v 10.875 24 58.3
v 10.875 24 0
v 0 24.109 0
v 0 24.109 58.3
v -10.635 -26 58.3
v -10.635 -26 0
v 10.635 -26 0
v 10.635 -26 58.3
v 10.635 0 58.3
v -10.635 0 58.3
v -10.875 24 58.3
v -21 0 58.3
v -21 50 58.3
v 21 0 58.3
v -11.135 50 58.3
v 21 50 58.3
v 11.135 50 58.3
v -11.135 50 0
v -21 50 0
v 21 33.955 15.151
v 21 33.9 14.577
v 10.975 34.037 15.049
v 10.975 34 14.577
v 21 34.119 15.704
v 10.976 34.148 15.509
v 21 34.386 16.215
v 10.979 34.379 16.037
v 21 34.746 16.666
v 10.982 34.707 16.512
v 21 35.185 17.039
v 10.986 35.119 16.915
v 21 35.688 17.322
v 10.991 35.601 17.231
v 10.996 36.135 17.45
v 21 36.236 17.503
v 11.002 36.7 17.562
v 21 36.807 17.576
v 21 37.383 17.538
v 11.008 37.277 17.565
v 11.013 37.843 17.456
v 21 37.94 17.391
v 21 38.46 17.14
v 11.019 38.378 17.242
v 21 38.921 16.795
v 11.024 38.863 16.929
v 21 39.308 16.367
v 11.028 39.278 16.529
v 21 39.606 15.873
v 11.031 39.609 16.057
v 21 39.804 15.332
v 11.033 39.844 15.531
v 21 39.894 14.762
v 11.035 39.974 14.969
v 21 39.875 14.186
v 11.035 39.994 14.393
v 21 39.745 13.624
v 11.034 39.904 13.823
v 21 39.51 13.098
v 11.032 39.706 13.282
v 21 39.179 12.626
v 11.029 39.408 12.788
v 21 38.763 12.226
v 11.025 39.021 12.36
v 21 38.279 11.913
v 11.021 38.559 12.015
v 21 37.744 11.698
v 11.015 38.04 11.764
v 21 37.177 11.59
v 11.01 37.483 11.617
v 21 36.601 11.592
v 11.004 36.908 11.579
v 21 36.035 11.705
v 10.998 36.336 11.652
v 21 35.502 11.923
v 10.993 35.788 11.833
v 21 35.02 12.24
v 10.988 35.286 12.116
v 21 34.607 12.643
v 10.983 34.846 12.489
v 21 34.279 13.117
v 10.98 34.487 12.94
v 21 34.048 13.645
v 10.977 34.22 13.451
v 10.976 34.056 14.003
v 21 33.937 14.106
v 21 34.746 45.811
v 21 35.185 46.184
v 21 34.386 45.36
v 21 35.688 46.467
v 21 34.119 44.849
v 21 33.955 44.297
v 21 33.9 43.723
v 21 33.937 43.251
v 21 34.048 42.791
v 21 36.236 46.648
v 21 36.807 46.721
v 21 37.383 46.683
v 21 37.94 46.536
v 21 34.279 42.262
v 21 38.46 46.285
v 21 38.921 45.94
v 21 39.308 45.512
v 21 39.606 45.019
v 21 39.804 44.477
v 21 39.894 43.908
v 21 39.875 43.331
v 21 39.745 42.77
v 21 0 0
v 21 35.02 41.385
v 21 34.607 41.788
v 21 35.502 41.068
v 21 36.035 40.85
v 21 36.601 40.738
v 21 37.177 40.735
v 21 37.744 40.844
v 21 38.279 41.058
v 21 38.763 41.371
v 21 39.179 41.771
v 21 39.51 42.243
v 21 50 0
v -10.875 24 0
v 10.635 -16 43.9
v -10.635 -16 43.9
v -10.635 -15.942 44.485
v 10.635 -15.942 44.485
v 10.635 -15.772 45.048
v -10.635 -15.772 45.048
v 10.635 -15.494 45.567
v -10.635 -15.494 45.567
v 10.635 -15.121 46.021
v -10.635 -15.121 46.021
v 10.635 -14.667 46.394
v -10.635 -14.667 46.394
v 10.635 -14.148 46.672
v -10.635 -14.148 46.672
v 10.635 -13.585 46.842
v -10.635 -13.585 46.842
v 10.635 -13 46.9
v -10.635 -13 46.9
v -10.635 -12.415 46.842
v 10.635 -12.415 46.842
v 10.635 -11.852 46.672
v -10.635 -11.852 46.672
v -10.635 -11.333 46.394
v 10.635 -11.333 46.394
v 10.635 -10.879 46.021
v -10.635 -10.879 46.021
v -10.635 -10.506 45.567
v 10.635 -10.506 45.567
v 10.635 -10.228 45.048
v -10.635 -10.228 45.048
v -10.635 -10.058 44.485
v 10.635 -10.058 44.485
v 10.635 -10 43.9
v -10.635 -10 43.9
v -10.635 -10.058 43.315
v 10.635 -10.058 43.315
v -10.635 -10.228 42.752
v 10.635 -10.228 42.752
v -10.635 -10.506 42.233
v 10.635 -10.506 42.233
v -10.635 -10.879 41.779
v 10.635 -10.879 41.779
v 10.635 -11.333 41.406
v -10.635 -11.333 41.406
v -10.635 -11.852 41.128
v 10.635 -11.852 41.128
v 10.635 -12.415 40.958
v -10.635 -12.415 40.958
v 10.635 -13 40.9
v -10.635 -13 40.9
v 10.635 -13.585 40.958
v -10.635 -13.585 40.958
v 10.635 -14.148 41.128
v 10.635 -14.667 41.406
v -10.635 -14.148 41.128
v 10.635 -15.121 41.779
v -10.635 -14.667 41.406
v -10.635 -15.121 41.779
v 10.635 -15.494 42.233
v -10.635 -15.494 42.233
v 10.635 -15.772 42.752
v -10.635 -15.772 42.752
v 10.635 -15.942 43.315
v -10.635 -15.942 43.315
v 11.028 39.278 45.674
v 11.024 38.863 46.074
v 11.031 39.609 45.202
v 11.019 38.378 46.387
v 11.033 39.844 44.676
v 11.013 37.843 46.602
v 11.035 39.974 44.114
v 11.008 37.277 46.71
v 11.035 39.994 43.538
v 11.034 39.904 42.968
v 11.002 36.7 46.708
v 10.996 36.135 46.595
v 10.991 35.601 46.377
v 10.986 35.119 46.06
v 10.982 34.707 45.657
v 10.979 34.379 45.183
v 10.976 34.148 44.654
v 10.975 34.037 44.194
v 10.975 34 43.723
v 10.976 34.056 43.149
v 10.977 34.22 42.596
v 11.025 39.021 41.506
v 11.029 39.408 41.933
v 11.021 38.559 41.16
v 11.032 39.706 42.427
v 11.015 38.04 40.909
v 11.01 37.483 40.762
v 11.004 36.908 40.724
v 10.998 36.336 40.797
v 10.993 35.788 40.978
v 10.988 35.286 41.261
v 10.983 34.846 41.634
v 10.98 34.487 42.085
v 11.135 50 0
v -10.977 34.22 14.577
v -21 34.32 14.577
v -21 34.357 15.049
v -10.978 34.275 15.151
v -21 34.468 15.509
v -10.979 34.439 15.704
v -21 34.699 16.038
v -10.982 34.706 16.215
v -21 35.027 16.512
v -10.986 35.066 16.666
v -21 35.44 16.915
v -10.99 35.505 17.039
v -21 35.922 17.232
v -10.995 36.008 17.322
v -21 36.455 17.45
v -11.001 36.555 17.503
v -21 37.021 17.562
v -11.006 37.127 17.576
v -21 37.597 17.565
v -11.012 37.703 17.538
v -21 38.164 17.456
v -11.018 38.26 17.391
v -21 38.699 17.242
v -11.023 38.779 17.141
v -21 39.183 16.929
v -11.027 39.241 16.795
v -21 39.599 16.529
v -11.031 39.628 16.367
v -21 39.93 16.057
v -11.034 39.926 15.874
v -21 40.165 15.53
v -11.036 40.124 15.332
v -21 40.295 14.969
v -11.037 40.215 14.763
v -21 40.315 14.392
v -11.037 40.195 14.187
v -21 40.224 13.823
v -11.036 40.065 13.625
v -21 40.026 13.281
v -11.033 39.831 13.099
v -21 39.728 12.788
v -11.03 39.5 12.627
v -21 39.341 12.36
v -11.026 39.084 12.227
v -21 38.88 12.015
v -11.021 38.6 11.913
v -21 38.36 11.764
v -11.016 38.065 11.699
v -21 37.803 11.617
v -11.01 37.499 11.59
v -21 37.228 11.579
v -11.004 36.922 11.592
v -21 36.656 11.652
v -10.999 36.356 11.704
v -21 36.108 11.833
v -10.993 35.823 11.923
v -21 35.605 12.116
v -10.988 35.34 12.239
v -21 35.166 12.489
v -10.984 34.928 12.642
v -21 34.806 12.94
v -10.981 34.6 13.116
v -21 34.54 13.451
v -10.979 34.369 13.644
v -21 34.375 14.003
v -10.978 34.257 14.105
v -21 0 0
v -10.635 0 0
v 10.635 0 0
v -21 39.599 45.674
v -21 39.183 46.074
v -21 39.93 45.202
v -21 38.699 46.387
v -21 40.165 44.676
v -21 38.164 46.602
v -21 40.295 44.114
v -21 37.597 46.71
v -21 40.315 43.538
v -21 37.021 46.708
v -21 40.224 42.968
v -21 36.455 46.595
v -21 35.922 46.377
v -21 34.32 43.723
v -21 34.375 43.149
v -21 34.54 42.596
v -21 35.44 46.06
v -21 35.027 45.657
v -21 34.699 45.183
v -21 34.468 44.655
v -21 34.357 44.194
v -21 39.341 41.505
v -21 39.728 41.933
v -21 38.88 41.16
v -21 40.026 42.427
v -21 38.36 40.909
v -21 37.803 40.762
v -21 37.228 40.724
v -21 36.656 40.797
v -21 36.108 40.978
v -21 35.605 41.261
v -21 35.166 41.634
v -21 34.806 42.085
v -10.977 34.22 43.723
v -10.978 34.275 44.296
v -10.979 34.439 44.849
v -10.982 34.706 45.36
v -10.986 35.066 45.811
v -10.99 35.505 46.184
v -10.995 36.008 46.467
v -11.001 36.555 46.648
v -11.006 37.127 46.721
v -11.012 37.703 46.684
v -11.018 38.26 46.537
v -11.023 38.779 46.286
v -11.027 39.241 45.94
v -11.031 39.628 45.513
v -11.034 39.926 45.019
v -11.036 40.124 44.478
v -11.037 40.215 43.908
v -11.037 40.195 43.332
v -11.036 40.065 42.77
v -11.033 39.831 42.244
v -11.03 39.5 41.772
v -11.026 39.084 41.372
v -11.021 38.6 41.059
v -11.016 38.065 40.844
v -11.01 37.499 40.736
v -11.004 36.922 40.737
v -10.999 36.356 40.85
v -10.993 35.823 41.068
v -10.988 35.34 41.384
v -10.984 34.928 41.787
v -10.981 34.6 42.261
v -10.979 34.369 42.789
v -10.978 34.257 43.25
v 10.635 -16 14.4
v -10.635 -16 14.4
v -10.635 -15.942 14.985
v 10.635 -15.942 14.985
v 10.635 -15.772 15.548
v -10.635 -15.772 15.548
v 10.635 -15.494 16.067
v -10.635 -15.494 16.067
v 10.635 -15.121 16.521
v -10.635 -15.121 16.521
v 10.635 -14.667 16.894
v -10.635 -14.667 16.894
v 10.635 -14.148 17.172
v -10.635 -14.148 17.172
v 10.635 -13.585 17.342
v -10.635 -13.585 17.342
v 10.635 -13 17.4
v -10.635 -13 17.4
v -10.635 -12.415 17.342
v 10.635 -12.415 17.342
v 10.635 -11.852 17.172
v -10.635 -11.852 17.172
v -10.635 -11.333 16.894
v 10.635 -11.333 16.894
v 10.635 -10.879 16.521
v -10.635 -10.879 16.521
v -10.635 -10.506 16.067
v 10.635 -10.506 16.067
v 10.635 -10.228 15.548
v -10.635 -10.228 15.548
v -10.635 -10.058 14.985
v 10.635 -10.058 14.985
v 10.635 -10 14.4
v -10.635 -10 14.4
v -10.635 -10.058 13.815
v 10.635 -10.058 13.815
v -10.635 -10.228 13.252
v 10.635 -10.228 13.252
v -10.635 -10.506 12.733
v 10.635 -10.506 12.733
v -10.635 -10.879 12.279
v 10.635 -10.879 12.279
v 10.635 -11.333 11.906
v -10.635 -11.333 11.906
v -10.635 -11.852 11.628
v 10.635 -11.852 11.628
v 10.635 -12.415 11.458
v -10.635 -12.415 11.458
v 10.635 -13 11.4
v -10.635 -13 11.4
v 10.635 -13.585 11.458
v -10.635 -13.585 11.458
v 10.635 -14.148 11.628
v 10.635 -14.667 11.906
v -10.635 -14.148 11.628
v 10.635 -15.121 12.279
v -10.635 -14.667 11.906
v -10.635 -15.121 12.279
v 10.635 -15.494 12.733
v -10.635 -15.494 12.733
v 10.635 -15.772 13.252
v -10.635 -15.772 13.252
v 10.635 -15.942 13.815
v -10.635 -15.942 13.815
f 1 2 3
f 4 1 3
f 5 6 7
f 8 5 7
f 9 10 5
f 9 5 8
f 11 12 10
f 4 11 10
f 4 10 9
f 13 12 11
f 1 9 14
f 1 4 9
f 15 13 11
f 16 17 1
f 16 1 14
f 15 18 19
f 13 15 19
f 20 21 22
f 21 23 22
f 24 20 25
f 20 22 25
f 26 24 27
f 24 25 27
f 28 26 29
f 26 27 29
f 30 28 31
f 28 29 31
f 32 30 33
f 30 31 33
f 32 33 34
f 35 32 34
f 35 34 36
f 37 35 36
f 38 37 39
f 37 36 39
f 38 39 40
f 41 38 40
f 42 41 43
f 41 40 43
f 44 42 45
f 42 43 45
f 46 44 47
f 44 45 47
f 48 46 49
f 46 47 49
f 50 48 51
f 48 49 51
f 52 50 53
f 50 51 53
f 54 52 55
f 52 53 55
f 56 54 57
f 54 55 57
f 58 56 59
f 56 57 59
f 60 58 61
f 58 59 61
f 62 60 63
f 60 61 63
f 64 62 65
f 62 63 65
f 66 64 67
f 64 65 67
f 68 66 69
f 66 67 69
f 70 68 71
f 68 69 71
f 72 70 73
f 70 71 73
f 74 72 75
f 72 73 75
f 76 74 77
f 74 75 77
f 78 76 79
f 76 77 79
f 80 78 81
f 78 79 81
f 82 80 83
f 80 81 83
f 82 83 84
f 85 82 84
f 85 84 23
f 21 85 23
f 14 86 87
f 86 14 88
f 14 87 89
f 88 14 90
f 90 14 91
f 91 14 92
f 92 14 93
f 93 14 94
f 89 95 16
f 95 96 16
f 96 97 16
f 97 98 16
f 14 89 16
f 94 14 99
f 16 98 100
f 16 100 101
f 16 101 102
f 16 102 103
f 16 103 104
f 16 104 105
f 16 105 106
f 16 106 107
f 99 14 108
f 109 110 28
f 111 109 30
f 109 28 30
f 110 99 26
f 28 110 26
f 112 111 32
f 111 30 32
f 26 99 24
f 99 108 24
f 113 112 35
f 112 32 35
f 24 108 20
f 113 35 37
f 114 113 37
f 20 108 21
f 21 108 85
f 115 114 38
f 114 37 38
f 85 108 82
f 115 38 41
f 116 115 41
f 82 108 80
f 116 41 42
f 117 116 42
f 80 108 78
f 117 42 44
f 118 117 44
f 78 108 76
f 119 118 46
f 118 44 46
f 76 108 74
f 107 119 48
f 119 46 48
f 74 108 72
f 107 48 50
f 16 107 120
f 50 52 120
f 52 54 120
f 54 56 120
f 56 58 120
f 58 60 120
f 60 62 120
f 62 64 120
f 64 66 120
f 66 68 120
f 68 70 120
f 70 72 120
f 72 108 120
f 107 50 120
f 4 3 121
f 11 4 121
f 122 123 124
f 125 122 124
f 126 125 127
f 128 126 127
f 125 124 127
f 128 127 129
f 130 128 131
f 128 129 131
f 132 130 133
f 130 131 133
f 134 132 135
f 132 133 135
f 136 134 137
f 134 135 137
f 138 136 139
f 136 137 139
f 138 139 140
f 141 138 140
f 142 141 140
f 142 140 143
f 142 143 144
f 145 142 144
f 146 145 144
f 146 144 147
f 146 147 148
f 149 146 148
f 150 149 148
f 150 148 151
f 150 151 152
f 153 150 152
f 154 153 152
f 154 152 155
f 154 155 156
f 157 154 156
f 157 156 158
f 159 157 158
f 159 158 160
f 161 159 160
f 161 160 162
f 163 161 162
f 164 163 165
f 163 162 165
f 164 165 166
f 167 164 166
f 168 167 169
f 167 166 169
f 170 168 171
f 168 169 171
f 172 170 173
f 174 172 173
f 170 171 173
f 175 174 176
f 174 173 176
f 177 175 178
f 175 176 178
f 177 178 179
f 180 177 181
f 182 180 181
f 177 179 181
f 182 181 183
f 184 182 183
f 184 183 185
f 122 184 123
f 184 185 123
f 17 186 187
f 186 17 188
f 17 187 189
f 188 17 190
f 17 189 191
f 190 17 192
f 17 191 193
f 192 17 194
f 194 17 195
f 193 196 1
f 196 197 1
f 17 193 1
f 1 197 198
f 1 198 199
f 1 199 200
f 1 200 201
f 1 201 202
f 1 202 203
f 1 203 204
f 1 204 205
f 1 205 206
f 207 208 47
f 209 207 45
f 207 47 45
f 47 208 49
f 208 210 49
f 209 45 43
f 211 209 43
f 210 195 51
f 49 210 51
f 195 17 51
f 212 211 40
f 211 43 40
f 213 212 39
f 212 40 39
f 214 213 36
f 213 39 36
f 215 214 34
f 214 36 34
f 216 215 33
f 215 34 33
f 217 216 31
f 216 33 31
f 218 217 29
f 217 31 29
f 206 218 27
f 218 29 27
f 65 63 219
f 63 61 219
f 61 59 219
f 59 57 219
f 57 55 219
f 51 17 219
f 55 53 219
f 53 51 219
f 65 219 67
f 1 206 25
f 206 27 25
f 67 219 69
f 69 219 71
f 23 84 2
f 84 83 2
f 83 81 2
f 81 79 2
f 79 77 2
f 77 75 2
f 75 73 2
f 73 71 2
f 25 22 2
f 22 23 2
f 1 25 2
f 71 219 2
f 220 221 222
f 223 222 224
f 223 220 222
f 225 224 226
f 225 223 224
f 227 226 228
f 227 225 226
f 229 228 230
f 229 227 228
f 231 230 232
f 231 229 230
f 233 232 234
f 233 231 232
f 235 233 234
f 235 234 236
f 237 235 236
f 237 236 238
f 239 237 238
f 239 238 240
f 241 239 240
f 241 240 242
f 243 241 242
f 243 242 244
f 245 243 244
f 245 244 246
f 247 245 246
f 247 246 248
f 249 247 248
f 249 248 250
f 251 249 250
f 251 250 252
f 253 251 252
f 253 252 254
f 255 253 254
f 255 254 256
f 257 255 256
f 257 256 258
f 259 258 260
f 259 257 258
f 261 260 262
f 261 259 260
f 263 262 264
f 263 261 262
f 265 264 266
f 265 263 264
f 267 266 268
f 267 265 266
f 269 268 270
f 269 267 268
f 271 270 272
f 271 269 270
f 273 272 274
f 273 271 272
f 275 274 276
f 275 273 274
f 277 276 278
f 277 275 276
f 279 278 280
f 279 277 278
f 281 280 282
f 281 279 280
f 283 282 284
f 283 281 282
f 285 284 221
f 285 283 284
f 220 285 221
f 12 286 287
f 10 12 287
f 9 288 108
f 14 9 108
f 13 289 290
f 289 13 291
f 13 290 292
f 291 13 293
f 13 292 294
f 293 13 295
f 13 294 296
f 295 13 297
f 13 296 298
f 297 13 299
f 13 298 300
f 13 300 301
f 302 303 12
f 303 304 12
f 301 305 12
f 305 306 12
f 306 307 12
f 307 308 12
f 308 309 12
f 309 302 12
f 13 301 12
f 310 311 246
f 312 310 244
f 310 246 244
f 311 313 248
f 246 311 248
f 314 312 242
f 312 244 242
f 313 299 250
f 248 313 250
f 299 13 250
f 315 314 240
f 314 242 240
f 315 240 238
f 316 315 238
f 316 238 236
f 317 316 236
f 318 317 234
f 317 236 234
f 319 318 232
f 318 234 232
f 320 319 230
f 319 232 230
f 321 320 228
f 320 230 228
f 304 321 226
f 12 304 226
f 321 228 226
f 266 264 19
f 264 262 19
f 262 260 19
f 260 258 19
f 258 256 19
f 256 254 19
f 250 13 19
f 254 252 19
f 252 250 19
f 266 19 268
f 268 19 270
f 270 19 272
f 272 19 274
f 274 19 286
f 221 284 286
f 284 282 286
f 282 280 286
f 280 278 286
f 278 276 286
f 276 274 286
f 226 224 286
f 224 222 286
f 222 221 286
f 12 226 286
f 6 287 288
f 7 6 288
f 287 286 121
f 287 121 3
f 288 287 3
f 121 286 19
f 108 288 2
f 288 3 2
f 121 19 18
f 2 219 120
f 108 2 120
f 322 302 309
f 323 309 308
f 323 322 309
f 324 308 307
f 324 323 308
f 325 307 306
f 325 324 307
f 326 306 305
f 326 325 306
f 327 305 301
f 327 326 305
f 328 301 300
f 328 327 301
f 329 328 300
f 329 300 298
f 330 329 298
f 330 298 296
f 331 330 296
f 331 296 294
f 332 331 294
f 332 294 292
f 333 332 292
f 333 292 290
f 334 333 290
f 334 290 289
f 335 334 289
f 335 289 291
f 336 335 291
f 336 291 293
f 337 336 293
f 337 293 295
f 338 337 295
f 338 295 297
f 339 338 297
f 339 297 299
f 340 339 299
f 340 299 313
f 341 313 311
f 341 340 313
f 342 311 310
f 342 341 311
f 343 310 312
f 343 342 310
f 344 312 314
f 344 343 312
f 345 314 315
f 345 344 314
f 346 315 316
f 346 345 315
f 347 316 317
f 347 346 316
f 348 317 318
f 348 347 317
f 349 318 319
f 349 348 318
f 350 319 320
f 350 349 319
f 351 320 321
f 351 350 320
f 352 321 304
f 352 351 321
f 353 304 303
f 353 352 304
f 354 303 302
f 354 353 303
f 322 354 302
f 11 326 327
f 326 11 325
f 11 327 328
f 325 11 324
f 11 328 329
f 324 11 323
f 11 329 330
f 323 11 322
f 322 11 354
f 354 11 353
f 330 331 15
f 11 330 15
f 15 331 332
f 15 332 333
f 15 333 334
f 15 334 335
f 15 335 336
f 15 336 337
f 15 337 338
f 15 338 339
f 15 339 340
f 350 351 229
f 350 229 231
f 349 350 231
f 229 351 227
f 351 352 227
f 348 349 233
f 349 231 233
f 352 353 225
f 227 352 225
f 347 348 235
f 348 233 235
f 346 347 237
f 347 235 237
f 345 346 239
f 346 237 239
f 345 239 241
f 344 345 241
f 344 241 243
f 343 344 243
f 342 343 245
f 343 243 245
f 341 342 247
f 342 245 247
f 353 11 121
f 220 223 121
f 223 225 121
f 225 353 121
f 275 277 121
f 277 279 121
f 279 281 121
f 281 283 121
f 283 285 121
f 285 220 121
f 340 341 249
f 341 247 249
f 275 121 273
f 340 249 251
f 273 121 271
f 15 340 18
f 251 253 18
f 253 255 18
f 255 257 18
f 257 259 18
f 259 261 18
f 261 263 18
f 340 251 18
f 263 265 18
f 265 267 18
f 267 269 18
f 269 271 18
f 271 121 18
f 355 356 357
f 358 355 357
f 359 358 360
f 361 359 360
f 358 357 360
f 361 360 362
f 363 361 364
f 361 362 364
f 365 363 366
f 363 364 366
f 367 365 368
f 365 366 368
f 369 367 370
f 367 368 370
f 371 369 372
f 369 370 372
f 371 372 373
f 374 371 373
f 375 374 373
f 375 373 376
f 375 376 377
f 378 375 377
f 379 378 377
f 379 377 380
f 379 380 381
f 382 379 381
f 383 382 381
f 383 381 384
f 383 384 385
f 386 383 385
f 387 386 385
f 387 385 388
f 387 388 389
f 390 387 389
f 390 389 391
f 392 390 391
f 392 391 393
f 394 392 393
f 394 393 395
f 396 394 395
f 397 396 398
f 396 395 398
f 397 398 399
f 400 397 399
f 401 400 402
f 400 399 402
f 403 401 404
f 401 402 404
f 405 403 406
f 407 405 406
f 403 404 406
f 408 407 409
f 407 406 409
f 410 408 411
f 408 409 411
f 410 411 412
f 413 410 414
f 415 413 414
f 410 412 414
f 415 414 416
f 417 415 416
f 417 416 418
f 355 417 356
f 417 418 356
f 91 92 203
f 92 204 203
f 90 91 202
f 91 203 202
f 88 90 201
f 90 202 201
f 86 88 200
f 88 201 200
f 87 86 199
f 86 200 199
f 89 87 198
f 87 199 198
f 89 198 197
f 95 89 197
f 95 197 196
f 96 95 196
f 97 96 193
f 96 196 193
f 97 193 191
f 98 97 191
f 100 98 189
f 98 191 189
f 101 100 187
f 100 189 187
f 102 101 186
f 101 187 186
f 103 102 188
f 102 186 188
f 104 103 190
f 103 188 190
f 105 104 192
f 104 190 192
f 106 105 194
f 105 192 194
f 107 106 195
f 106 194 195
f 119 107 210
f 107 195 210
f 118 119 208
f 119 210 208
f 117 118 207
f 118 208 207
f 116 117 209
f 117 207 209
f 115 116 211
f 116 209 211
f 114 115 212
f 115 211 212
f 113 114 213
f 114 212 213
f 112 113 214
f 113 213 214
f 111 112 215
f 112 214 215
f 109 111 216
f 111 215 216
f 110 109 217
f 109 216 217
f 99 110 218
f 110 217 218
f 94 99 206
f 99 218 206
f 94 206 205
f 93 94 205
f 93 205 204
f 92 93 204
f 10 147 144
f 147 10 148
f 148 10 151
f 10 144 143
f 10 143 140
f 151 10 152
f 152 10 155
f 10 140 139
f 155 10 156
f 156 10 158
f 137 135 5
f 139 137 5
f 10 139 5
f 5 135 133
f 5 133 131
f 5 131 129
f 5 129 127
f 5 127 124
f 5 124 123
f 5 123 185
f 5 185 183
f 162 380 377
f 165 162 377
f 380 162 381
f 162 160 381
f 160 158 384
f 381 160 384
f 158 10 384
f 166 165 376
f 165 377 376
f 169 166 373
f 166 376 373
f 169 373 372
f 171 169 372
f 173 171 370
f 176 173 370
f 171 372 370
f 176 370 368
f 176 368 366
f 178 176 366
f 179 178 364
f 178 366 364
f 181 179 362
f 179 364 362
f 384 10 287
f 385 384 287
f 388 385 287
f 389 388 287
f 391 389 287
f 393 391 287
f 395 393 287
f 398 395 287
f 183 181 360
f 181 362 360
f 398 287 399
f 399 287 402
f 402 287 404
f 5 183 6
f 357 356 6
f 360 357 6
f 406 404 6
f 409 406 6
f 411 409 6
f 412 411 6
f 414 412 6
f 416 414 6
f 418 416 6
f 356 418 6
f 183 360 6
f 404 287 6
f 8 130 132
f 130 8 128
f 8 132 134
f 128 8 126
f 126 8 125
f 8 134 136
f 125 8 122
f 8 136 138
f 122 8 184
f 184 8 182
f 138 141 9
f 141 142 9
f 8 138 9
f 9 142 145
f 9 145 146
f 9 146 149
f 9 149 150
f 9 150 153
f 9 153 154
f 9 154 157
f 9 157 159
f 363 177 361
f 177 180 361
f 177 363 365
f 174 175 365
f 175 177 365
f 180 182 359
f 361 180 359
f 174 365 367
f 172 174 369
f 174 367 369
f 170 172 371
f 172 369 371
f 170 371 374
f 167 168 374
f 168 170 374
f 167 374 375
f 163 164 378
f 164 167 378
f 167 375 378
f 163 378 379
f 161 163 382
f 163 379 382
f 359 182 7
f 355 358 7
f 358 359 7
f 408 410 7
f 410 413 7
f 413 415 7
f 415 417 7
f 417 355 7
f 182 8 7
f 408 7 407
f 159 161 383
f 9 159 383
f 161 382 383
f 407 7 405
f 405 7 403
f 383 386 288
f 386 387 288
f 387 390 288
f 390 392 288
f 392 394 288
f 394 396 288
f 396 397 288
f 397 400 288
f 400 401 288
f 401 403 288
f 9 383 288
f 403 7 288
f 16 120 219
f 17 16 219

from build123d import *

# Parameters (mm, degrees)
F1_DEPTH = 58.3
F2_R     = 3
F3_DEPTH = 25
F4_R     = 3
F5_DEPTH = 25
F6_DEPTH = 100


with BuildPart() as f1:
    # F0 (on Top) → F1 (new body)
    with BuildSketch(Plane.XY):
        Polygon((-10.635, 0), (-10.635, -26), (10.635, -26), (10.635, 0), (21, 0), (21, 50), (11.135, 50), (10.875, 24), (0, 24.10875), (-10.875, 24), (-11.135, 50), (-21, 50), (-21, 0), align=None)
    extrude(amount=F1_DEPTH)

    # F2 (on face) → F3 (cut)
    with BuildSketch(Plane(origin=(-10.635, 0, 0), x_dir=(0, -1, 0), z_dir=(-1, 0, 0))):
        with Locations((13, 14.4)):
            Circle(F2_R)
        with Locations((13, 43.9)):
            Circle(F2_R)
    extrude(amount=-F3_DEPTH, mode=Mode.SUBTRACT)

    # F4 (on face) → F5 (cut)
    with BuildSketch(Plane(origin=(10.633937, -0.106339, 0), x_dir=(-0.01, -0.99995, 0), z_dir=(-0.99995, 0.01, 0))):
        with Locations((-37.108195, 14.577401)):
            Circle(F4_R)
        with Locations((-37.108195, 43.722599)):
            Circle(F4_R)
    extrude(amount=-F5_DEPTH, mode=Mode.SUBTRACT)

    # F4 (on face) → F6 (cut)
    with BuildSketch(Plane(origin=(10.633937, -0.106339, 0), x_dir=(-0.01, -0.99995, 0), z_dir=(-0.99995, 0.01, 0))):
        with Locations((-37.108195, 43.722599)):
            Circle(F4_R)
        with Locations((-37.108195, 14.577401)):
            Circle(F4_R)
    extrude(amount=F6_DEPTH, mode=Mode.SUBTRACT)


solid = f1.part
